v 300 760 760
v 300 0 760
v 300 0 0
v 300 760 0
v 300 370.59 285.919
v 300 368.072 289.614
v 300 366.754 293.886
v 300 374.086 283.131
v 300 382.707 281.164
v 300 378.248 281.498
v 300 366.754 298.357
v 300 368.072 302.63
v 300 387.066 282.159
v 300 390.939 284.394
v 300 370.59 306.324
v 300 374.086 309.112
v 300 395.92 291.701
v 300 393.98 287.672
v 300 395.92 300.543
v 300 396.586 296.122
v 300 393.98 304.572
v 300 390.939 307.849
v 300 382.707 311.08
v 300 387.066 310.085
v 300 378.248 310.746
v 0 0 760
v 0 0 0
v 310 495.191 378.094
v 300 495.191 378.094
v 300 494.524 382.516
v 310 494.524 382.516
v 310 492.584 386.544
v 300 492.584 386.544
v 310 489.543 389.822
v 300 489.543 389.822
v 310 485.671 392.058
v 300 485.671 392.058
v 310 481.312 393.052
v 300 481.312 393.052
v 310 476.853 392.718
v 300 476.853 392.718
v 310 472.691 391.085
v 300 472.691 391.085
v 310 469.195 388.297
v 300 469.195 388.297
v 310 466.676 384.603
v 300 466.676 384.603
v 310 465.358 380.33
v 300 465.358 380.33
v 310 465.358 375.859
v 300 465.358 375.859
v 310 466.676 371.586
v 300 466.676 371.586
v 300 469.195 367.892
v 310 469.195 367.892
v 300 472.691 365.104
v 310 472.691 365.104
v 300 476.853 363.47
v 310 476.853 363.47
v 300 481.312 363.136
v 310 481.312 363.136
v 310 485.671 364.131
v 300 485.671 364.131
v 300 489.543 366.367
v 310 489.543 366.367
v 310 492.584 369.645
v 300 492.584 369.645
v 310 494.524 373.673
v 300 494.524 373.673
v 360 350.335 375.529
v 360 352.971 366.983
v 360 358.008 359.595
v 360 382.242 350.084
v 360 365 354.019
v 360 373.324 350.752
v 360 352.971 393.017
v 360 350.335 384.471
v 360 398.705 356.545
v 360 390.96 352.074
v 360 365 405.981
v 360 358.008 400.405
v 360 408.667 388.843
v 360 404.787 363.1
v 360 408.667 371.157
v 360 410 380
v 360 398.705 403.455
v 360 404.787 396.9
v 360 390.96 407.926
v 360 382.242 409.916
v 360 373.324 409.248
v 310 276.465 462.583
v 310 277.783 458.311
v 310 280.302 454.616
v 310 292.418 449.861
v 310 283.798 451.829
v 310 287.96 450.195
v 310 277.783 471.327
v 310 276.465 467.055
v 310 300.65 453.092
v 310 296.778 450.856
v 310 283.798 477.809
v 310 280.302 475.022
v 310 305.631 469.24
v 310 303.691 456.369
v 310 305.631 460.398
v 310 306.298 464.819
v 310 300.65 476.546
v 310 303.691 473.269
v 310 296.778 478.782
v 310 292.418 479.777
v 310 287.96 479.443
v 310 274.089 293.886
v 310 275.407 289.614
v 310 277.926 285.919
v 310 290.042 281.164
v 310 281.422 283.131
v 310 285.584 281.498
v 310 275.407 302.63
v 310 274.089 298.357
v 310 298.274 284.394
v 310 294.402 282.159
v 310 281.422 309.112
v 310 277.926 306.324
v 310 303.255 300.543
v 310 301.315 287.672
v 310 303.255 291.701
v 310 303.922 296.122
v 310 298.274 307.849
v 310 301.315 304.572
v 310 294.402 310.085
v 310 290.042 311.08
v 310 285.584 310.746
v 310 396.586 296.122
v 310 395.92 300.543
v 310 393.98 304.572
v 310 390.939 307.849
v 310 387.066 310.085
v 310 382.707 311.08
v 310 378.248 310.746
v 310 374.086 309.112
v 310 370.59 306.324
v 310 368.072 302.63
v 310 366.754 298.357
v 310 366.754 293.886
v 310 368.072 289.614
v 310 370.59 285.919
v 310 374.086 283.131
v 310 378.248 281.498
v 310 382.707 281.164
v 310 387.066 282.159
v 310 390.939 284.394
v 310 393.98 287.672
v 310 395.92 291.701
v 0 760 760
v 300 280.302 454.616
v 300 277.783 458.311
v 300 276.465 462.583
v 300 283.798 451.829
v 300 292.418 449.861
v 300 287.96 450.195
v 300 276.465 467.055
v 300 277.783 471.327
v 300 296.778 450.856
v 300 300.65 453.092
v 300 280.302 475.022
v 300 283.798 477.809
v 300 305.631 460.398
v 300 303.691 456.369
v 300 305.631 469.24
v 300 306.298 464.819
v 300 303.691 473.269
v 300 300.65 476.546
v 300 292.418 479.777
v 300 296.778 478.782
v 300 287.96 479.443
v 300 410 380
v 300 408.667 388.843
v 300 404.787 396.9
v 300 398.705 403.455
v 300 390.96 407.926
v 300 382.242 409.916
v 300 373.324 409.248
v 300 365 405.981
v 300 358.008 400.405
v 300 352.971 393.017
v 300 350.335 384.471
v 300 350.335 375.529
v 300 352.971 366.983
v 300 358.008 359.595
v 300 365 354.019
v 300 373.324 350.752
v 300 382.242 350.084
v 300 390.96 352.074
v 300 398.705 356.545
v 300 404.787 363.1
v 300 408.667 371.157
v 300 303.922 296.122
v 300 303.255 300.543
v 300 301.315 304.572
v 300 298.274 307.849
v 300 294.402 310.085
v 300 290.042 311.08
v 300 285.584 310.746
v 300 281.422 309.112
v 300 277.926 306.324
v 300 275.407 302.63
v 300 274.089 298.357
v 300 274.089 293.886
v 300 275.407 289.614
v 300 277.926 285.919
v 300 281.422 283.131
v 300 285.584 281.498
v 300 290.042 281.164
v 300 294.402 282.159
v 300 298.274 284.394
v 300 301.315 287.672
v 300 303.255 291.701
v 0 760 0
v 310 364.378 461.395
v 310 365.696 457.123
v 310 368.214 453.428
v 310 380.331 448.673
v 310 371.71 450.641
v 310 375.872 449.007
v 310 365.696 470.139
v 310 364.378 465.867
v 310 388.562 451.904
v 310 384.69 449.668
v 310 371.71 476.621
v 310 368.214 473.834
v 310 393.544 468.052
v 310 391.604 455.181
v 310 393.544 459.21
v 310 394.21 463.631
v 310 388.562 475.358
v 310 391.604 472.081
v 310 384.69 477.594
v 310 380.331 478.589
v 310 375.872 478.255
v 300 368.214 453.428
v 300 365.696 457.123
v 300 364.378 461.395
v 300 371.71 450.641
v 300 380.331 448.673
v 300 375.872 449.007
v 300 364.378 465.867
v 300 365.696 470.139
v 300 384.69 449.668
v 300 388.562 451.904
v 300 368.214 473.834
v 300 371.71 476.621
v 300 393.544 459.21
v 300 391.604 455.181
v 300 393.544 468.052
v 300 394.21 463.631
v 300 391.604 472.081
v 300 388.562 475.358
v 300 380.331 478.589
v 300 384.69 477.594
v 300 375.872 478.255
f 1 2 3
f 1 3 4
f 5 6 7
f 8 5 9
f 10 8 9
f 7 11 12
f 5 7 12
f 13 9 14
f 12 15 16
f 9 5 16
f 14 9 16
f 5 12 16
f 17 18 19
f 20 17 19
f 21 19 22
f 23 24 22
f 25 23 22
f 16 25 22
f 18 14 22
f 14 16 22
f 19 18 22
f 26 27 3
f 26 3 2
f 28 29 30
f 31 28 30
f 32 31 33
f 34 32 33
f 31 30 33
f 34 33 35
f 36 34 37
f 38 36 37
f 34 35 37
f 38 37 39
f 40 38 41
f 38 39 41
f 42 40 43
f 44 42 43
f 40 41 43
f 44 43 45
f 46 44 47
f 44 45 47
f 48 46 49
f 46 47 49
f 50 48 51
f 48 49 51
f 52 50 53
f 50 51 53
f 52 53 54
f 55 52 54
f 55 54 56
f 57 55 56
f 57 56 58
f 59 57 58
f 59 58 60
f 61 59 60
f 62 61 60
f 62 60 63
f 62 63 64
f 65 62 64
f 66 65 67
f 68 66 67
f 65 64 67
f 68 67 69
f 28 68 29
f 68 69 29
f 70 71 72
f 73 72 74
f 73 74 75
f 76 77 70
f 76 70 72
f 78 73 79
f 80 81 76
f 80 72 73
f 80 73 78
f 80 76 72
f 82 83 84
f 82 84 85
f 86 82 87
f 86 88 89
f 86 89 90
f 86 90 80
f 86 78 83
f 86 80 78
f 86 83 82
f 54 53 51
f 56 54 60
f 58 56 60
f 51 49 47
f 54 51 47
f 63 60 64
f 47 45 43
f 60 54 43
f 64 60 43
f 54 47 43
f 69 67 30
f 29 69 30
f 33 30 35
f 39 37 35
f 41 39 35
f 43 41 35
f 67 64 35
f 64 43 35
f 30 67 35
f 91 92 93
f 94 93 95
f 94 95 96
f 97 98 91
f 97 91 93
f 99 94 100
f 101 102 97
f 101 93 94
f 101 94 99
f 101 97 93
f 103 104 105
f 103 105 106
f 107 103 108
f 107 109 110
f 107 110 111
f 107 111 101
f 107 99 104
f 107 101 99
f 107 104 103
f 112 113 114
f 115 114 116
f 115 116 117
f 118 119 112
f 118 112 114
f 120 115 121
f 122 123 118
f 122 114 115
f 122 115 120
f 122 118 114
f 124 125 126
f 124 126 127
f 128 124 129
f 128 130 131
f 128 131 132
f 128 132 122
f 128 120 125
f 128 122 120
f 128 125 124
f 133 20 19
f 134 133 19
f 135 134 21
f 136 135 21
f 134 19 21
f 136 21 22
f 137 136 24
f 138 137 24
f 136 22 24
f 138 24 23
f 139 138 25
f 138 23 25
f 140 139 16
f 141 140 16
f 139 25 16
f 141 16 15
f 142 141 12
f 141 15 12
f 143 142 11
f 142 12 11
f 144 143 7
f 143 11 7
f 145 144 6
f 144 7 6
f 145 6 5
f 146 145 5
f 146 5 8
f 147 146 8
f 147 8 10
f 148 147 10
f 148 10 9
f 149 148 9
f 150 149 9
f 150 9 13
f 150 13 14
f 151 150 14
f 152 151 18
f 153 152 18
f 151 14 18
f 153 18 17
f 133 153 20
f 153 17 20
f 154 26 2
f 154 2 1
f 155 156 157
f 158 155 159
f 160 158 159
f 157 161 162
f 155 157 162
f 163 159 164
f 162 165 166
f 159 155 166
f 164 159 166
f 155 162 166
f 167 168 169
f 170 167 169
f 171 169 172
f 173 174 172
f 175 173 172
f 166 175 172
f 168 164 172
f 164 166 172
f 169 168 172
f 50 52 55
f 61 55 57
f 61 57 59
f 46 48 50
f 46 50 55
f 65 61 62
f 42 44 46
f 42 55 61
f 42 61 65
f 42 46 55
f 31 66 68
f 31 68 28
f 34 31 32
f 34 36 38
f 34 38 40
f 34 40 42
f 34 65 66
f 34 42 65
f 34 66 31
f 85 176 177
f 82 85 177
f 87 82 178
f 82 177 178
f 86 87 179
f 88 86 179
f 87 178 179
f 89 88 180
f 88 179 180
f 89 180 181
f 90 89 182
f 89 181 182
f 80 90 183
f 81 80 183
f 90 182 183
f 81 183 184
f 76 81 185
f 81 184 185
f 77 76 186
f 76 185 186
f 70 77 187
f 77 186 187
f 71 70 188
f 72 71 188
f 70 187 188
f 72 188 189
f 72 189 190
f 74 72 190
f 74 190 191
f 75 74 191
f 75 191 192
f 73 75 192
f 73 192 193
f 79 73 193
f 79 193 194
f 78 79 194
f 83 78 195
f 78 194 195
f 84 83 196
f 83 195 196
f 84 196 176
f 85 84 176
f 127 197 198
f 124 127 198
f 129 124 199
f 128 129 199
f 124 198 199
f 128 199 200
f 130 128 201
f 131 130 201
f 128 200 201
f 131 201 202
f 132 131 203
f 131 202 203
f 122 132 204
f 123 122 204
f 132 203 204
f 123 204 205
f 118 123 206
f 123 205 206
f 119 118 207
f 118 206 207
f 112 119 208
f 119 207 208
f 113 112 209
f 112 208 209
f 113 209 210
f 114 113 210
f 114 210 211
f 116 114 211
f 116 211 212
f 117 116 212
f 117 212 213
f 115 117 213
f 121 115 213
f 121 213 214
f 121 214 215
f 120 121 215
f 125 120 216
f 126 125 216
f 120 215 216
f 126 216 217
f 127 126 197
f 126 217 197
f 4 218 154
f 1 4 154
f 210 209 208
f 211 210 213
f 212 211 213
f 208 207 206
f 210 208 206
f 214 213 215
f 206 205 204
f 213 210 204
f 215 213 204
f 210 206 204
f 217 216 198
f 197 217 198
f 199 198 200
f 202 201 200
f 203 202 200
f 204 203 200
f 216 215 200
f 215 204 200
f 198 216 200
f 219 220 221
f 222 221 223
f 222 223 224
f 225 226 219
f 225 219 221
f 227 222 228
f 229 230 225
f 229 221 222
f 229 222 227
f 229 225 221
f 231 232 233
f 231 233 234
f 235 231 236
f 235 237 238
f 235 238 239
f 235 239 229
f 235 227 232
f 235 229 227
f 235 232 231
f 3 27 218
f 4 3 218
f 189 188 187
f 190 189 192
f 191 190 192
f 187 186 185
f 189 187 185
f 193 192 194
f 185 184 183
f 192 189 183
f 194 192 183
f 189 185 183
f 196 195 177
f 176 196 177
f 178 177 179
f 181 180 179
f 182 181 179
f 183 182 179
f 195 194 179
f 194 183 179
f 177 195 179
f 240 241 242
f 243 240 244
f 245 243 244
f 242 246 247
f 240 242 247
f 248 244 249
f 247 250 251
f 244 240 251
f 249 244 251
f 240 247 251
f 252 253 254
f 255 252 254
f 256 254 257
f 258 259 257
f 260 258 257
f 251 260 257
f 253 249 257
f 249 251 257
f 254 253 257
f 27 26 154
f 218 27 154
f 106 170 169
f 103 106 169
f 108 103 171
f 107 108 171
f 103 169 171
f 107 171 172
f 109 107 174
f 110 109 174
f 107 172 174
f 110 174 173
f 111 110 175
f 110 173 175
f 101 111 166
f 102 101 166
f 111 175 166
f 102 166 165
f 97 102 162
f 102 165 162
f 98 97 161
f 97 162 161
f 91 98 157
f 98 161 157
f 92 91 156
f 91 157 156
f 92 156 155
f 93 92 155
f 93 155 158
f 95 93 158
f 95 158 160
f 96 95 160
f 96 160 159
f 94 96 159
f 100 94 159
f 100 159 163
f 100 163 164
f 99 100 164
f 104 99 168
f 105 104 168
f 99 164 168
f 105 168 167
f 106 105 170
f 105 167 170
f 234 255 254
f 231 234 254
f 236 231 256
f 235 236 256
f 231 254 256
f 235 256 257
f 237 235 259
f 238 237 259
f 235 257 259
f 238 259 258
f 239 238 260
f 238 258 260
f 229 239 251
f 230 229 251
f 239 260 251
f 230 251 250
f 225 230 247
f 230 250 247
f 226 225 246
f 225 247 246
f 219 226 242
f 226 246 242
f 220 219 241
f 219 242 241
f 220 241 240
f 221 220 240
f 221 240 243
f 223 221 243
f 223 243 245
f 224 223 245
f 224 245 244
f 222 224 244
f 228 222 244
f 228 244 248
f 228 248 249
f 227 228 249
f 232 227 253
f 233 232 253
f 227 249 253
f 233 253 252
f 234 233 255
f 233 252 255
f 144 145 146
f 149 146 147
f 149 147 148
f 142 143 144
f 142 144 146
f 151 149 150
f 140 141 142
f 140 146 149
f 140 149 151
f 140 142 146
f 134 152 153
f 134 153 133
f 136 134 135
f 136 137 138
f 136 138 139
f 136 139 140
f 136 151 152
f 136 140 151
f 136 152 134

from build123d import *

# Parameters (mm, degrees)
F0_W     = 760
F0_H     = 760
F1_DEPTH = 300
F2_R     = 30
F3_DEPTH = 60
F2_R_2   = 15
F4_DEPTH = 10


with BuildPart() as f1:
    # F0 (on Right) → F1 (new body)
    with BuildSketch(Plane.YZ):
        with Locations((380, 380)):
            Rectangle(F0_W, F0_H)
    extrude(amount=F1_DEPTH)


with BuildPart() as f3:
    # F2 (on face) → F3 (new body)
    with BuildSketch(Plane.YZ.offset(300)):
        with Locations((380, 380)):
            Circle(F2_R)
    extrude(amount=F3_DEPTH)


with BuildPart() as f4:
    # F2 (on face) → F4 (new body)
    with BuildSketch(Plane.YZ.offset(300)):
        with Locations((288.921505, 296.121836)):
            Circle(F2_R_2)
        with Locations((291.297525, 464.818984)):
            Circle(F2_R_2)
        with Locations((381.586164, 296.121836)):
            Circle(F2_R_2)
        with Locations((379.210144, 463.631004)):
            Circle(F2_R_2)
        with Locations((480.190814, 378.094405)):
            Circle(F2_R_2)
    extrude(amount=F4_DEPTH)


solid = Compound([f1.part, f3.part, f4.part])
